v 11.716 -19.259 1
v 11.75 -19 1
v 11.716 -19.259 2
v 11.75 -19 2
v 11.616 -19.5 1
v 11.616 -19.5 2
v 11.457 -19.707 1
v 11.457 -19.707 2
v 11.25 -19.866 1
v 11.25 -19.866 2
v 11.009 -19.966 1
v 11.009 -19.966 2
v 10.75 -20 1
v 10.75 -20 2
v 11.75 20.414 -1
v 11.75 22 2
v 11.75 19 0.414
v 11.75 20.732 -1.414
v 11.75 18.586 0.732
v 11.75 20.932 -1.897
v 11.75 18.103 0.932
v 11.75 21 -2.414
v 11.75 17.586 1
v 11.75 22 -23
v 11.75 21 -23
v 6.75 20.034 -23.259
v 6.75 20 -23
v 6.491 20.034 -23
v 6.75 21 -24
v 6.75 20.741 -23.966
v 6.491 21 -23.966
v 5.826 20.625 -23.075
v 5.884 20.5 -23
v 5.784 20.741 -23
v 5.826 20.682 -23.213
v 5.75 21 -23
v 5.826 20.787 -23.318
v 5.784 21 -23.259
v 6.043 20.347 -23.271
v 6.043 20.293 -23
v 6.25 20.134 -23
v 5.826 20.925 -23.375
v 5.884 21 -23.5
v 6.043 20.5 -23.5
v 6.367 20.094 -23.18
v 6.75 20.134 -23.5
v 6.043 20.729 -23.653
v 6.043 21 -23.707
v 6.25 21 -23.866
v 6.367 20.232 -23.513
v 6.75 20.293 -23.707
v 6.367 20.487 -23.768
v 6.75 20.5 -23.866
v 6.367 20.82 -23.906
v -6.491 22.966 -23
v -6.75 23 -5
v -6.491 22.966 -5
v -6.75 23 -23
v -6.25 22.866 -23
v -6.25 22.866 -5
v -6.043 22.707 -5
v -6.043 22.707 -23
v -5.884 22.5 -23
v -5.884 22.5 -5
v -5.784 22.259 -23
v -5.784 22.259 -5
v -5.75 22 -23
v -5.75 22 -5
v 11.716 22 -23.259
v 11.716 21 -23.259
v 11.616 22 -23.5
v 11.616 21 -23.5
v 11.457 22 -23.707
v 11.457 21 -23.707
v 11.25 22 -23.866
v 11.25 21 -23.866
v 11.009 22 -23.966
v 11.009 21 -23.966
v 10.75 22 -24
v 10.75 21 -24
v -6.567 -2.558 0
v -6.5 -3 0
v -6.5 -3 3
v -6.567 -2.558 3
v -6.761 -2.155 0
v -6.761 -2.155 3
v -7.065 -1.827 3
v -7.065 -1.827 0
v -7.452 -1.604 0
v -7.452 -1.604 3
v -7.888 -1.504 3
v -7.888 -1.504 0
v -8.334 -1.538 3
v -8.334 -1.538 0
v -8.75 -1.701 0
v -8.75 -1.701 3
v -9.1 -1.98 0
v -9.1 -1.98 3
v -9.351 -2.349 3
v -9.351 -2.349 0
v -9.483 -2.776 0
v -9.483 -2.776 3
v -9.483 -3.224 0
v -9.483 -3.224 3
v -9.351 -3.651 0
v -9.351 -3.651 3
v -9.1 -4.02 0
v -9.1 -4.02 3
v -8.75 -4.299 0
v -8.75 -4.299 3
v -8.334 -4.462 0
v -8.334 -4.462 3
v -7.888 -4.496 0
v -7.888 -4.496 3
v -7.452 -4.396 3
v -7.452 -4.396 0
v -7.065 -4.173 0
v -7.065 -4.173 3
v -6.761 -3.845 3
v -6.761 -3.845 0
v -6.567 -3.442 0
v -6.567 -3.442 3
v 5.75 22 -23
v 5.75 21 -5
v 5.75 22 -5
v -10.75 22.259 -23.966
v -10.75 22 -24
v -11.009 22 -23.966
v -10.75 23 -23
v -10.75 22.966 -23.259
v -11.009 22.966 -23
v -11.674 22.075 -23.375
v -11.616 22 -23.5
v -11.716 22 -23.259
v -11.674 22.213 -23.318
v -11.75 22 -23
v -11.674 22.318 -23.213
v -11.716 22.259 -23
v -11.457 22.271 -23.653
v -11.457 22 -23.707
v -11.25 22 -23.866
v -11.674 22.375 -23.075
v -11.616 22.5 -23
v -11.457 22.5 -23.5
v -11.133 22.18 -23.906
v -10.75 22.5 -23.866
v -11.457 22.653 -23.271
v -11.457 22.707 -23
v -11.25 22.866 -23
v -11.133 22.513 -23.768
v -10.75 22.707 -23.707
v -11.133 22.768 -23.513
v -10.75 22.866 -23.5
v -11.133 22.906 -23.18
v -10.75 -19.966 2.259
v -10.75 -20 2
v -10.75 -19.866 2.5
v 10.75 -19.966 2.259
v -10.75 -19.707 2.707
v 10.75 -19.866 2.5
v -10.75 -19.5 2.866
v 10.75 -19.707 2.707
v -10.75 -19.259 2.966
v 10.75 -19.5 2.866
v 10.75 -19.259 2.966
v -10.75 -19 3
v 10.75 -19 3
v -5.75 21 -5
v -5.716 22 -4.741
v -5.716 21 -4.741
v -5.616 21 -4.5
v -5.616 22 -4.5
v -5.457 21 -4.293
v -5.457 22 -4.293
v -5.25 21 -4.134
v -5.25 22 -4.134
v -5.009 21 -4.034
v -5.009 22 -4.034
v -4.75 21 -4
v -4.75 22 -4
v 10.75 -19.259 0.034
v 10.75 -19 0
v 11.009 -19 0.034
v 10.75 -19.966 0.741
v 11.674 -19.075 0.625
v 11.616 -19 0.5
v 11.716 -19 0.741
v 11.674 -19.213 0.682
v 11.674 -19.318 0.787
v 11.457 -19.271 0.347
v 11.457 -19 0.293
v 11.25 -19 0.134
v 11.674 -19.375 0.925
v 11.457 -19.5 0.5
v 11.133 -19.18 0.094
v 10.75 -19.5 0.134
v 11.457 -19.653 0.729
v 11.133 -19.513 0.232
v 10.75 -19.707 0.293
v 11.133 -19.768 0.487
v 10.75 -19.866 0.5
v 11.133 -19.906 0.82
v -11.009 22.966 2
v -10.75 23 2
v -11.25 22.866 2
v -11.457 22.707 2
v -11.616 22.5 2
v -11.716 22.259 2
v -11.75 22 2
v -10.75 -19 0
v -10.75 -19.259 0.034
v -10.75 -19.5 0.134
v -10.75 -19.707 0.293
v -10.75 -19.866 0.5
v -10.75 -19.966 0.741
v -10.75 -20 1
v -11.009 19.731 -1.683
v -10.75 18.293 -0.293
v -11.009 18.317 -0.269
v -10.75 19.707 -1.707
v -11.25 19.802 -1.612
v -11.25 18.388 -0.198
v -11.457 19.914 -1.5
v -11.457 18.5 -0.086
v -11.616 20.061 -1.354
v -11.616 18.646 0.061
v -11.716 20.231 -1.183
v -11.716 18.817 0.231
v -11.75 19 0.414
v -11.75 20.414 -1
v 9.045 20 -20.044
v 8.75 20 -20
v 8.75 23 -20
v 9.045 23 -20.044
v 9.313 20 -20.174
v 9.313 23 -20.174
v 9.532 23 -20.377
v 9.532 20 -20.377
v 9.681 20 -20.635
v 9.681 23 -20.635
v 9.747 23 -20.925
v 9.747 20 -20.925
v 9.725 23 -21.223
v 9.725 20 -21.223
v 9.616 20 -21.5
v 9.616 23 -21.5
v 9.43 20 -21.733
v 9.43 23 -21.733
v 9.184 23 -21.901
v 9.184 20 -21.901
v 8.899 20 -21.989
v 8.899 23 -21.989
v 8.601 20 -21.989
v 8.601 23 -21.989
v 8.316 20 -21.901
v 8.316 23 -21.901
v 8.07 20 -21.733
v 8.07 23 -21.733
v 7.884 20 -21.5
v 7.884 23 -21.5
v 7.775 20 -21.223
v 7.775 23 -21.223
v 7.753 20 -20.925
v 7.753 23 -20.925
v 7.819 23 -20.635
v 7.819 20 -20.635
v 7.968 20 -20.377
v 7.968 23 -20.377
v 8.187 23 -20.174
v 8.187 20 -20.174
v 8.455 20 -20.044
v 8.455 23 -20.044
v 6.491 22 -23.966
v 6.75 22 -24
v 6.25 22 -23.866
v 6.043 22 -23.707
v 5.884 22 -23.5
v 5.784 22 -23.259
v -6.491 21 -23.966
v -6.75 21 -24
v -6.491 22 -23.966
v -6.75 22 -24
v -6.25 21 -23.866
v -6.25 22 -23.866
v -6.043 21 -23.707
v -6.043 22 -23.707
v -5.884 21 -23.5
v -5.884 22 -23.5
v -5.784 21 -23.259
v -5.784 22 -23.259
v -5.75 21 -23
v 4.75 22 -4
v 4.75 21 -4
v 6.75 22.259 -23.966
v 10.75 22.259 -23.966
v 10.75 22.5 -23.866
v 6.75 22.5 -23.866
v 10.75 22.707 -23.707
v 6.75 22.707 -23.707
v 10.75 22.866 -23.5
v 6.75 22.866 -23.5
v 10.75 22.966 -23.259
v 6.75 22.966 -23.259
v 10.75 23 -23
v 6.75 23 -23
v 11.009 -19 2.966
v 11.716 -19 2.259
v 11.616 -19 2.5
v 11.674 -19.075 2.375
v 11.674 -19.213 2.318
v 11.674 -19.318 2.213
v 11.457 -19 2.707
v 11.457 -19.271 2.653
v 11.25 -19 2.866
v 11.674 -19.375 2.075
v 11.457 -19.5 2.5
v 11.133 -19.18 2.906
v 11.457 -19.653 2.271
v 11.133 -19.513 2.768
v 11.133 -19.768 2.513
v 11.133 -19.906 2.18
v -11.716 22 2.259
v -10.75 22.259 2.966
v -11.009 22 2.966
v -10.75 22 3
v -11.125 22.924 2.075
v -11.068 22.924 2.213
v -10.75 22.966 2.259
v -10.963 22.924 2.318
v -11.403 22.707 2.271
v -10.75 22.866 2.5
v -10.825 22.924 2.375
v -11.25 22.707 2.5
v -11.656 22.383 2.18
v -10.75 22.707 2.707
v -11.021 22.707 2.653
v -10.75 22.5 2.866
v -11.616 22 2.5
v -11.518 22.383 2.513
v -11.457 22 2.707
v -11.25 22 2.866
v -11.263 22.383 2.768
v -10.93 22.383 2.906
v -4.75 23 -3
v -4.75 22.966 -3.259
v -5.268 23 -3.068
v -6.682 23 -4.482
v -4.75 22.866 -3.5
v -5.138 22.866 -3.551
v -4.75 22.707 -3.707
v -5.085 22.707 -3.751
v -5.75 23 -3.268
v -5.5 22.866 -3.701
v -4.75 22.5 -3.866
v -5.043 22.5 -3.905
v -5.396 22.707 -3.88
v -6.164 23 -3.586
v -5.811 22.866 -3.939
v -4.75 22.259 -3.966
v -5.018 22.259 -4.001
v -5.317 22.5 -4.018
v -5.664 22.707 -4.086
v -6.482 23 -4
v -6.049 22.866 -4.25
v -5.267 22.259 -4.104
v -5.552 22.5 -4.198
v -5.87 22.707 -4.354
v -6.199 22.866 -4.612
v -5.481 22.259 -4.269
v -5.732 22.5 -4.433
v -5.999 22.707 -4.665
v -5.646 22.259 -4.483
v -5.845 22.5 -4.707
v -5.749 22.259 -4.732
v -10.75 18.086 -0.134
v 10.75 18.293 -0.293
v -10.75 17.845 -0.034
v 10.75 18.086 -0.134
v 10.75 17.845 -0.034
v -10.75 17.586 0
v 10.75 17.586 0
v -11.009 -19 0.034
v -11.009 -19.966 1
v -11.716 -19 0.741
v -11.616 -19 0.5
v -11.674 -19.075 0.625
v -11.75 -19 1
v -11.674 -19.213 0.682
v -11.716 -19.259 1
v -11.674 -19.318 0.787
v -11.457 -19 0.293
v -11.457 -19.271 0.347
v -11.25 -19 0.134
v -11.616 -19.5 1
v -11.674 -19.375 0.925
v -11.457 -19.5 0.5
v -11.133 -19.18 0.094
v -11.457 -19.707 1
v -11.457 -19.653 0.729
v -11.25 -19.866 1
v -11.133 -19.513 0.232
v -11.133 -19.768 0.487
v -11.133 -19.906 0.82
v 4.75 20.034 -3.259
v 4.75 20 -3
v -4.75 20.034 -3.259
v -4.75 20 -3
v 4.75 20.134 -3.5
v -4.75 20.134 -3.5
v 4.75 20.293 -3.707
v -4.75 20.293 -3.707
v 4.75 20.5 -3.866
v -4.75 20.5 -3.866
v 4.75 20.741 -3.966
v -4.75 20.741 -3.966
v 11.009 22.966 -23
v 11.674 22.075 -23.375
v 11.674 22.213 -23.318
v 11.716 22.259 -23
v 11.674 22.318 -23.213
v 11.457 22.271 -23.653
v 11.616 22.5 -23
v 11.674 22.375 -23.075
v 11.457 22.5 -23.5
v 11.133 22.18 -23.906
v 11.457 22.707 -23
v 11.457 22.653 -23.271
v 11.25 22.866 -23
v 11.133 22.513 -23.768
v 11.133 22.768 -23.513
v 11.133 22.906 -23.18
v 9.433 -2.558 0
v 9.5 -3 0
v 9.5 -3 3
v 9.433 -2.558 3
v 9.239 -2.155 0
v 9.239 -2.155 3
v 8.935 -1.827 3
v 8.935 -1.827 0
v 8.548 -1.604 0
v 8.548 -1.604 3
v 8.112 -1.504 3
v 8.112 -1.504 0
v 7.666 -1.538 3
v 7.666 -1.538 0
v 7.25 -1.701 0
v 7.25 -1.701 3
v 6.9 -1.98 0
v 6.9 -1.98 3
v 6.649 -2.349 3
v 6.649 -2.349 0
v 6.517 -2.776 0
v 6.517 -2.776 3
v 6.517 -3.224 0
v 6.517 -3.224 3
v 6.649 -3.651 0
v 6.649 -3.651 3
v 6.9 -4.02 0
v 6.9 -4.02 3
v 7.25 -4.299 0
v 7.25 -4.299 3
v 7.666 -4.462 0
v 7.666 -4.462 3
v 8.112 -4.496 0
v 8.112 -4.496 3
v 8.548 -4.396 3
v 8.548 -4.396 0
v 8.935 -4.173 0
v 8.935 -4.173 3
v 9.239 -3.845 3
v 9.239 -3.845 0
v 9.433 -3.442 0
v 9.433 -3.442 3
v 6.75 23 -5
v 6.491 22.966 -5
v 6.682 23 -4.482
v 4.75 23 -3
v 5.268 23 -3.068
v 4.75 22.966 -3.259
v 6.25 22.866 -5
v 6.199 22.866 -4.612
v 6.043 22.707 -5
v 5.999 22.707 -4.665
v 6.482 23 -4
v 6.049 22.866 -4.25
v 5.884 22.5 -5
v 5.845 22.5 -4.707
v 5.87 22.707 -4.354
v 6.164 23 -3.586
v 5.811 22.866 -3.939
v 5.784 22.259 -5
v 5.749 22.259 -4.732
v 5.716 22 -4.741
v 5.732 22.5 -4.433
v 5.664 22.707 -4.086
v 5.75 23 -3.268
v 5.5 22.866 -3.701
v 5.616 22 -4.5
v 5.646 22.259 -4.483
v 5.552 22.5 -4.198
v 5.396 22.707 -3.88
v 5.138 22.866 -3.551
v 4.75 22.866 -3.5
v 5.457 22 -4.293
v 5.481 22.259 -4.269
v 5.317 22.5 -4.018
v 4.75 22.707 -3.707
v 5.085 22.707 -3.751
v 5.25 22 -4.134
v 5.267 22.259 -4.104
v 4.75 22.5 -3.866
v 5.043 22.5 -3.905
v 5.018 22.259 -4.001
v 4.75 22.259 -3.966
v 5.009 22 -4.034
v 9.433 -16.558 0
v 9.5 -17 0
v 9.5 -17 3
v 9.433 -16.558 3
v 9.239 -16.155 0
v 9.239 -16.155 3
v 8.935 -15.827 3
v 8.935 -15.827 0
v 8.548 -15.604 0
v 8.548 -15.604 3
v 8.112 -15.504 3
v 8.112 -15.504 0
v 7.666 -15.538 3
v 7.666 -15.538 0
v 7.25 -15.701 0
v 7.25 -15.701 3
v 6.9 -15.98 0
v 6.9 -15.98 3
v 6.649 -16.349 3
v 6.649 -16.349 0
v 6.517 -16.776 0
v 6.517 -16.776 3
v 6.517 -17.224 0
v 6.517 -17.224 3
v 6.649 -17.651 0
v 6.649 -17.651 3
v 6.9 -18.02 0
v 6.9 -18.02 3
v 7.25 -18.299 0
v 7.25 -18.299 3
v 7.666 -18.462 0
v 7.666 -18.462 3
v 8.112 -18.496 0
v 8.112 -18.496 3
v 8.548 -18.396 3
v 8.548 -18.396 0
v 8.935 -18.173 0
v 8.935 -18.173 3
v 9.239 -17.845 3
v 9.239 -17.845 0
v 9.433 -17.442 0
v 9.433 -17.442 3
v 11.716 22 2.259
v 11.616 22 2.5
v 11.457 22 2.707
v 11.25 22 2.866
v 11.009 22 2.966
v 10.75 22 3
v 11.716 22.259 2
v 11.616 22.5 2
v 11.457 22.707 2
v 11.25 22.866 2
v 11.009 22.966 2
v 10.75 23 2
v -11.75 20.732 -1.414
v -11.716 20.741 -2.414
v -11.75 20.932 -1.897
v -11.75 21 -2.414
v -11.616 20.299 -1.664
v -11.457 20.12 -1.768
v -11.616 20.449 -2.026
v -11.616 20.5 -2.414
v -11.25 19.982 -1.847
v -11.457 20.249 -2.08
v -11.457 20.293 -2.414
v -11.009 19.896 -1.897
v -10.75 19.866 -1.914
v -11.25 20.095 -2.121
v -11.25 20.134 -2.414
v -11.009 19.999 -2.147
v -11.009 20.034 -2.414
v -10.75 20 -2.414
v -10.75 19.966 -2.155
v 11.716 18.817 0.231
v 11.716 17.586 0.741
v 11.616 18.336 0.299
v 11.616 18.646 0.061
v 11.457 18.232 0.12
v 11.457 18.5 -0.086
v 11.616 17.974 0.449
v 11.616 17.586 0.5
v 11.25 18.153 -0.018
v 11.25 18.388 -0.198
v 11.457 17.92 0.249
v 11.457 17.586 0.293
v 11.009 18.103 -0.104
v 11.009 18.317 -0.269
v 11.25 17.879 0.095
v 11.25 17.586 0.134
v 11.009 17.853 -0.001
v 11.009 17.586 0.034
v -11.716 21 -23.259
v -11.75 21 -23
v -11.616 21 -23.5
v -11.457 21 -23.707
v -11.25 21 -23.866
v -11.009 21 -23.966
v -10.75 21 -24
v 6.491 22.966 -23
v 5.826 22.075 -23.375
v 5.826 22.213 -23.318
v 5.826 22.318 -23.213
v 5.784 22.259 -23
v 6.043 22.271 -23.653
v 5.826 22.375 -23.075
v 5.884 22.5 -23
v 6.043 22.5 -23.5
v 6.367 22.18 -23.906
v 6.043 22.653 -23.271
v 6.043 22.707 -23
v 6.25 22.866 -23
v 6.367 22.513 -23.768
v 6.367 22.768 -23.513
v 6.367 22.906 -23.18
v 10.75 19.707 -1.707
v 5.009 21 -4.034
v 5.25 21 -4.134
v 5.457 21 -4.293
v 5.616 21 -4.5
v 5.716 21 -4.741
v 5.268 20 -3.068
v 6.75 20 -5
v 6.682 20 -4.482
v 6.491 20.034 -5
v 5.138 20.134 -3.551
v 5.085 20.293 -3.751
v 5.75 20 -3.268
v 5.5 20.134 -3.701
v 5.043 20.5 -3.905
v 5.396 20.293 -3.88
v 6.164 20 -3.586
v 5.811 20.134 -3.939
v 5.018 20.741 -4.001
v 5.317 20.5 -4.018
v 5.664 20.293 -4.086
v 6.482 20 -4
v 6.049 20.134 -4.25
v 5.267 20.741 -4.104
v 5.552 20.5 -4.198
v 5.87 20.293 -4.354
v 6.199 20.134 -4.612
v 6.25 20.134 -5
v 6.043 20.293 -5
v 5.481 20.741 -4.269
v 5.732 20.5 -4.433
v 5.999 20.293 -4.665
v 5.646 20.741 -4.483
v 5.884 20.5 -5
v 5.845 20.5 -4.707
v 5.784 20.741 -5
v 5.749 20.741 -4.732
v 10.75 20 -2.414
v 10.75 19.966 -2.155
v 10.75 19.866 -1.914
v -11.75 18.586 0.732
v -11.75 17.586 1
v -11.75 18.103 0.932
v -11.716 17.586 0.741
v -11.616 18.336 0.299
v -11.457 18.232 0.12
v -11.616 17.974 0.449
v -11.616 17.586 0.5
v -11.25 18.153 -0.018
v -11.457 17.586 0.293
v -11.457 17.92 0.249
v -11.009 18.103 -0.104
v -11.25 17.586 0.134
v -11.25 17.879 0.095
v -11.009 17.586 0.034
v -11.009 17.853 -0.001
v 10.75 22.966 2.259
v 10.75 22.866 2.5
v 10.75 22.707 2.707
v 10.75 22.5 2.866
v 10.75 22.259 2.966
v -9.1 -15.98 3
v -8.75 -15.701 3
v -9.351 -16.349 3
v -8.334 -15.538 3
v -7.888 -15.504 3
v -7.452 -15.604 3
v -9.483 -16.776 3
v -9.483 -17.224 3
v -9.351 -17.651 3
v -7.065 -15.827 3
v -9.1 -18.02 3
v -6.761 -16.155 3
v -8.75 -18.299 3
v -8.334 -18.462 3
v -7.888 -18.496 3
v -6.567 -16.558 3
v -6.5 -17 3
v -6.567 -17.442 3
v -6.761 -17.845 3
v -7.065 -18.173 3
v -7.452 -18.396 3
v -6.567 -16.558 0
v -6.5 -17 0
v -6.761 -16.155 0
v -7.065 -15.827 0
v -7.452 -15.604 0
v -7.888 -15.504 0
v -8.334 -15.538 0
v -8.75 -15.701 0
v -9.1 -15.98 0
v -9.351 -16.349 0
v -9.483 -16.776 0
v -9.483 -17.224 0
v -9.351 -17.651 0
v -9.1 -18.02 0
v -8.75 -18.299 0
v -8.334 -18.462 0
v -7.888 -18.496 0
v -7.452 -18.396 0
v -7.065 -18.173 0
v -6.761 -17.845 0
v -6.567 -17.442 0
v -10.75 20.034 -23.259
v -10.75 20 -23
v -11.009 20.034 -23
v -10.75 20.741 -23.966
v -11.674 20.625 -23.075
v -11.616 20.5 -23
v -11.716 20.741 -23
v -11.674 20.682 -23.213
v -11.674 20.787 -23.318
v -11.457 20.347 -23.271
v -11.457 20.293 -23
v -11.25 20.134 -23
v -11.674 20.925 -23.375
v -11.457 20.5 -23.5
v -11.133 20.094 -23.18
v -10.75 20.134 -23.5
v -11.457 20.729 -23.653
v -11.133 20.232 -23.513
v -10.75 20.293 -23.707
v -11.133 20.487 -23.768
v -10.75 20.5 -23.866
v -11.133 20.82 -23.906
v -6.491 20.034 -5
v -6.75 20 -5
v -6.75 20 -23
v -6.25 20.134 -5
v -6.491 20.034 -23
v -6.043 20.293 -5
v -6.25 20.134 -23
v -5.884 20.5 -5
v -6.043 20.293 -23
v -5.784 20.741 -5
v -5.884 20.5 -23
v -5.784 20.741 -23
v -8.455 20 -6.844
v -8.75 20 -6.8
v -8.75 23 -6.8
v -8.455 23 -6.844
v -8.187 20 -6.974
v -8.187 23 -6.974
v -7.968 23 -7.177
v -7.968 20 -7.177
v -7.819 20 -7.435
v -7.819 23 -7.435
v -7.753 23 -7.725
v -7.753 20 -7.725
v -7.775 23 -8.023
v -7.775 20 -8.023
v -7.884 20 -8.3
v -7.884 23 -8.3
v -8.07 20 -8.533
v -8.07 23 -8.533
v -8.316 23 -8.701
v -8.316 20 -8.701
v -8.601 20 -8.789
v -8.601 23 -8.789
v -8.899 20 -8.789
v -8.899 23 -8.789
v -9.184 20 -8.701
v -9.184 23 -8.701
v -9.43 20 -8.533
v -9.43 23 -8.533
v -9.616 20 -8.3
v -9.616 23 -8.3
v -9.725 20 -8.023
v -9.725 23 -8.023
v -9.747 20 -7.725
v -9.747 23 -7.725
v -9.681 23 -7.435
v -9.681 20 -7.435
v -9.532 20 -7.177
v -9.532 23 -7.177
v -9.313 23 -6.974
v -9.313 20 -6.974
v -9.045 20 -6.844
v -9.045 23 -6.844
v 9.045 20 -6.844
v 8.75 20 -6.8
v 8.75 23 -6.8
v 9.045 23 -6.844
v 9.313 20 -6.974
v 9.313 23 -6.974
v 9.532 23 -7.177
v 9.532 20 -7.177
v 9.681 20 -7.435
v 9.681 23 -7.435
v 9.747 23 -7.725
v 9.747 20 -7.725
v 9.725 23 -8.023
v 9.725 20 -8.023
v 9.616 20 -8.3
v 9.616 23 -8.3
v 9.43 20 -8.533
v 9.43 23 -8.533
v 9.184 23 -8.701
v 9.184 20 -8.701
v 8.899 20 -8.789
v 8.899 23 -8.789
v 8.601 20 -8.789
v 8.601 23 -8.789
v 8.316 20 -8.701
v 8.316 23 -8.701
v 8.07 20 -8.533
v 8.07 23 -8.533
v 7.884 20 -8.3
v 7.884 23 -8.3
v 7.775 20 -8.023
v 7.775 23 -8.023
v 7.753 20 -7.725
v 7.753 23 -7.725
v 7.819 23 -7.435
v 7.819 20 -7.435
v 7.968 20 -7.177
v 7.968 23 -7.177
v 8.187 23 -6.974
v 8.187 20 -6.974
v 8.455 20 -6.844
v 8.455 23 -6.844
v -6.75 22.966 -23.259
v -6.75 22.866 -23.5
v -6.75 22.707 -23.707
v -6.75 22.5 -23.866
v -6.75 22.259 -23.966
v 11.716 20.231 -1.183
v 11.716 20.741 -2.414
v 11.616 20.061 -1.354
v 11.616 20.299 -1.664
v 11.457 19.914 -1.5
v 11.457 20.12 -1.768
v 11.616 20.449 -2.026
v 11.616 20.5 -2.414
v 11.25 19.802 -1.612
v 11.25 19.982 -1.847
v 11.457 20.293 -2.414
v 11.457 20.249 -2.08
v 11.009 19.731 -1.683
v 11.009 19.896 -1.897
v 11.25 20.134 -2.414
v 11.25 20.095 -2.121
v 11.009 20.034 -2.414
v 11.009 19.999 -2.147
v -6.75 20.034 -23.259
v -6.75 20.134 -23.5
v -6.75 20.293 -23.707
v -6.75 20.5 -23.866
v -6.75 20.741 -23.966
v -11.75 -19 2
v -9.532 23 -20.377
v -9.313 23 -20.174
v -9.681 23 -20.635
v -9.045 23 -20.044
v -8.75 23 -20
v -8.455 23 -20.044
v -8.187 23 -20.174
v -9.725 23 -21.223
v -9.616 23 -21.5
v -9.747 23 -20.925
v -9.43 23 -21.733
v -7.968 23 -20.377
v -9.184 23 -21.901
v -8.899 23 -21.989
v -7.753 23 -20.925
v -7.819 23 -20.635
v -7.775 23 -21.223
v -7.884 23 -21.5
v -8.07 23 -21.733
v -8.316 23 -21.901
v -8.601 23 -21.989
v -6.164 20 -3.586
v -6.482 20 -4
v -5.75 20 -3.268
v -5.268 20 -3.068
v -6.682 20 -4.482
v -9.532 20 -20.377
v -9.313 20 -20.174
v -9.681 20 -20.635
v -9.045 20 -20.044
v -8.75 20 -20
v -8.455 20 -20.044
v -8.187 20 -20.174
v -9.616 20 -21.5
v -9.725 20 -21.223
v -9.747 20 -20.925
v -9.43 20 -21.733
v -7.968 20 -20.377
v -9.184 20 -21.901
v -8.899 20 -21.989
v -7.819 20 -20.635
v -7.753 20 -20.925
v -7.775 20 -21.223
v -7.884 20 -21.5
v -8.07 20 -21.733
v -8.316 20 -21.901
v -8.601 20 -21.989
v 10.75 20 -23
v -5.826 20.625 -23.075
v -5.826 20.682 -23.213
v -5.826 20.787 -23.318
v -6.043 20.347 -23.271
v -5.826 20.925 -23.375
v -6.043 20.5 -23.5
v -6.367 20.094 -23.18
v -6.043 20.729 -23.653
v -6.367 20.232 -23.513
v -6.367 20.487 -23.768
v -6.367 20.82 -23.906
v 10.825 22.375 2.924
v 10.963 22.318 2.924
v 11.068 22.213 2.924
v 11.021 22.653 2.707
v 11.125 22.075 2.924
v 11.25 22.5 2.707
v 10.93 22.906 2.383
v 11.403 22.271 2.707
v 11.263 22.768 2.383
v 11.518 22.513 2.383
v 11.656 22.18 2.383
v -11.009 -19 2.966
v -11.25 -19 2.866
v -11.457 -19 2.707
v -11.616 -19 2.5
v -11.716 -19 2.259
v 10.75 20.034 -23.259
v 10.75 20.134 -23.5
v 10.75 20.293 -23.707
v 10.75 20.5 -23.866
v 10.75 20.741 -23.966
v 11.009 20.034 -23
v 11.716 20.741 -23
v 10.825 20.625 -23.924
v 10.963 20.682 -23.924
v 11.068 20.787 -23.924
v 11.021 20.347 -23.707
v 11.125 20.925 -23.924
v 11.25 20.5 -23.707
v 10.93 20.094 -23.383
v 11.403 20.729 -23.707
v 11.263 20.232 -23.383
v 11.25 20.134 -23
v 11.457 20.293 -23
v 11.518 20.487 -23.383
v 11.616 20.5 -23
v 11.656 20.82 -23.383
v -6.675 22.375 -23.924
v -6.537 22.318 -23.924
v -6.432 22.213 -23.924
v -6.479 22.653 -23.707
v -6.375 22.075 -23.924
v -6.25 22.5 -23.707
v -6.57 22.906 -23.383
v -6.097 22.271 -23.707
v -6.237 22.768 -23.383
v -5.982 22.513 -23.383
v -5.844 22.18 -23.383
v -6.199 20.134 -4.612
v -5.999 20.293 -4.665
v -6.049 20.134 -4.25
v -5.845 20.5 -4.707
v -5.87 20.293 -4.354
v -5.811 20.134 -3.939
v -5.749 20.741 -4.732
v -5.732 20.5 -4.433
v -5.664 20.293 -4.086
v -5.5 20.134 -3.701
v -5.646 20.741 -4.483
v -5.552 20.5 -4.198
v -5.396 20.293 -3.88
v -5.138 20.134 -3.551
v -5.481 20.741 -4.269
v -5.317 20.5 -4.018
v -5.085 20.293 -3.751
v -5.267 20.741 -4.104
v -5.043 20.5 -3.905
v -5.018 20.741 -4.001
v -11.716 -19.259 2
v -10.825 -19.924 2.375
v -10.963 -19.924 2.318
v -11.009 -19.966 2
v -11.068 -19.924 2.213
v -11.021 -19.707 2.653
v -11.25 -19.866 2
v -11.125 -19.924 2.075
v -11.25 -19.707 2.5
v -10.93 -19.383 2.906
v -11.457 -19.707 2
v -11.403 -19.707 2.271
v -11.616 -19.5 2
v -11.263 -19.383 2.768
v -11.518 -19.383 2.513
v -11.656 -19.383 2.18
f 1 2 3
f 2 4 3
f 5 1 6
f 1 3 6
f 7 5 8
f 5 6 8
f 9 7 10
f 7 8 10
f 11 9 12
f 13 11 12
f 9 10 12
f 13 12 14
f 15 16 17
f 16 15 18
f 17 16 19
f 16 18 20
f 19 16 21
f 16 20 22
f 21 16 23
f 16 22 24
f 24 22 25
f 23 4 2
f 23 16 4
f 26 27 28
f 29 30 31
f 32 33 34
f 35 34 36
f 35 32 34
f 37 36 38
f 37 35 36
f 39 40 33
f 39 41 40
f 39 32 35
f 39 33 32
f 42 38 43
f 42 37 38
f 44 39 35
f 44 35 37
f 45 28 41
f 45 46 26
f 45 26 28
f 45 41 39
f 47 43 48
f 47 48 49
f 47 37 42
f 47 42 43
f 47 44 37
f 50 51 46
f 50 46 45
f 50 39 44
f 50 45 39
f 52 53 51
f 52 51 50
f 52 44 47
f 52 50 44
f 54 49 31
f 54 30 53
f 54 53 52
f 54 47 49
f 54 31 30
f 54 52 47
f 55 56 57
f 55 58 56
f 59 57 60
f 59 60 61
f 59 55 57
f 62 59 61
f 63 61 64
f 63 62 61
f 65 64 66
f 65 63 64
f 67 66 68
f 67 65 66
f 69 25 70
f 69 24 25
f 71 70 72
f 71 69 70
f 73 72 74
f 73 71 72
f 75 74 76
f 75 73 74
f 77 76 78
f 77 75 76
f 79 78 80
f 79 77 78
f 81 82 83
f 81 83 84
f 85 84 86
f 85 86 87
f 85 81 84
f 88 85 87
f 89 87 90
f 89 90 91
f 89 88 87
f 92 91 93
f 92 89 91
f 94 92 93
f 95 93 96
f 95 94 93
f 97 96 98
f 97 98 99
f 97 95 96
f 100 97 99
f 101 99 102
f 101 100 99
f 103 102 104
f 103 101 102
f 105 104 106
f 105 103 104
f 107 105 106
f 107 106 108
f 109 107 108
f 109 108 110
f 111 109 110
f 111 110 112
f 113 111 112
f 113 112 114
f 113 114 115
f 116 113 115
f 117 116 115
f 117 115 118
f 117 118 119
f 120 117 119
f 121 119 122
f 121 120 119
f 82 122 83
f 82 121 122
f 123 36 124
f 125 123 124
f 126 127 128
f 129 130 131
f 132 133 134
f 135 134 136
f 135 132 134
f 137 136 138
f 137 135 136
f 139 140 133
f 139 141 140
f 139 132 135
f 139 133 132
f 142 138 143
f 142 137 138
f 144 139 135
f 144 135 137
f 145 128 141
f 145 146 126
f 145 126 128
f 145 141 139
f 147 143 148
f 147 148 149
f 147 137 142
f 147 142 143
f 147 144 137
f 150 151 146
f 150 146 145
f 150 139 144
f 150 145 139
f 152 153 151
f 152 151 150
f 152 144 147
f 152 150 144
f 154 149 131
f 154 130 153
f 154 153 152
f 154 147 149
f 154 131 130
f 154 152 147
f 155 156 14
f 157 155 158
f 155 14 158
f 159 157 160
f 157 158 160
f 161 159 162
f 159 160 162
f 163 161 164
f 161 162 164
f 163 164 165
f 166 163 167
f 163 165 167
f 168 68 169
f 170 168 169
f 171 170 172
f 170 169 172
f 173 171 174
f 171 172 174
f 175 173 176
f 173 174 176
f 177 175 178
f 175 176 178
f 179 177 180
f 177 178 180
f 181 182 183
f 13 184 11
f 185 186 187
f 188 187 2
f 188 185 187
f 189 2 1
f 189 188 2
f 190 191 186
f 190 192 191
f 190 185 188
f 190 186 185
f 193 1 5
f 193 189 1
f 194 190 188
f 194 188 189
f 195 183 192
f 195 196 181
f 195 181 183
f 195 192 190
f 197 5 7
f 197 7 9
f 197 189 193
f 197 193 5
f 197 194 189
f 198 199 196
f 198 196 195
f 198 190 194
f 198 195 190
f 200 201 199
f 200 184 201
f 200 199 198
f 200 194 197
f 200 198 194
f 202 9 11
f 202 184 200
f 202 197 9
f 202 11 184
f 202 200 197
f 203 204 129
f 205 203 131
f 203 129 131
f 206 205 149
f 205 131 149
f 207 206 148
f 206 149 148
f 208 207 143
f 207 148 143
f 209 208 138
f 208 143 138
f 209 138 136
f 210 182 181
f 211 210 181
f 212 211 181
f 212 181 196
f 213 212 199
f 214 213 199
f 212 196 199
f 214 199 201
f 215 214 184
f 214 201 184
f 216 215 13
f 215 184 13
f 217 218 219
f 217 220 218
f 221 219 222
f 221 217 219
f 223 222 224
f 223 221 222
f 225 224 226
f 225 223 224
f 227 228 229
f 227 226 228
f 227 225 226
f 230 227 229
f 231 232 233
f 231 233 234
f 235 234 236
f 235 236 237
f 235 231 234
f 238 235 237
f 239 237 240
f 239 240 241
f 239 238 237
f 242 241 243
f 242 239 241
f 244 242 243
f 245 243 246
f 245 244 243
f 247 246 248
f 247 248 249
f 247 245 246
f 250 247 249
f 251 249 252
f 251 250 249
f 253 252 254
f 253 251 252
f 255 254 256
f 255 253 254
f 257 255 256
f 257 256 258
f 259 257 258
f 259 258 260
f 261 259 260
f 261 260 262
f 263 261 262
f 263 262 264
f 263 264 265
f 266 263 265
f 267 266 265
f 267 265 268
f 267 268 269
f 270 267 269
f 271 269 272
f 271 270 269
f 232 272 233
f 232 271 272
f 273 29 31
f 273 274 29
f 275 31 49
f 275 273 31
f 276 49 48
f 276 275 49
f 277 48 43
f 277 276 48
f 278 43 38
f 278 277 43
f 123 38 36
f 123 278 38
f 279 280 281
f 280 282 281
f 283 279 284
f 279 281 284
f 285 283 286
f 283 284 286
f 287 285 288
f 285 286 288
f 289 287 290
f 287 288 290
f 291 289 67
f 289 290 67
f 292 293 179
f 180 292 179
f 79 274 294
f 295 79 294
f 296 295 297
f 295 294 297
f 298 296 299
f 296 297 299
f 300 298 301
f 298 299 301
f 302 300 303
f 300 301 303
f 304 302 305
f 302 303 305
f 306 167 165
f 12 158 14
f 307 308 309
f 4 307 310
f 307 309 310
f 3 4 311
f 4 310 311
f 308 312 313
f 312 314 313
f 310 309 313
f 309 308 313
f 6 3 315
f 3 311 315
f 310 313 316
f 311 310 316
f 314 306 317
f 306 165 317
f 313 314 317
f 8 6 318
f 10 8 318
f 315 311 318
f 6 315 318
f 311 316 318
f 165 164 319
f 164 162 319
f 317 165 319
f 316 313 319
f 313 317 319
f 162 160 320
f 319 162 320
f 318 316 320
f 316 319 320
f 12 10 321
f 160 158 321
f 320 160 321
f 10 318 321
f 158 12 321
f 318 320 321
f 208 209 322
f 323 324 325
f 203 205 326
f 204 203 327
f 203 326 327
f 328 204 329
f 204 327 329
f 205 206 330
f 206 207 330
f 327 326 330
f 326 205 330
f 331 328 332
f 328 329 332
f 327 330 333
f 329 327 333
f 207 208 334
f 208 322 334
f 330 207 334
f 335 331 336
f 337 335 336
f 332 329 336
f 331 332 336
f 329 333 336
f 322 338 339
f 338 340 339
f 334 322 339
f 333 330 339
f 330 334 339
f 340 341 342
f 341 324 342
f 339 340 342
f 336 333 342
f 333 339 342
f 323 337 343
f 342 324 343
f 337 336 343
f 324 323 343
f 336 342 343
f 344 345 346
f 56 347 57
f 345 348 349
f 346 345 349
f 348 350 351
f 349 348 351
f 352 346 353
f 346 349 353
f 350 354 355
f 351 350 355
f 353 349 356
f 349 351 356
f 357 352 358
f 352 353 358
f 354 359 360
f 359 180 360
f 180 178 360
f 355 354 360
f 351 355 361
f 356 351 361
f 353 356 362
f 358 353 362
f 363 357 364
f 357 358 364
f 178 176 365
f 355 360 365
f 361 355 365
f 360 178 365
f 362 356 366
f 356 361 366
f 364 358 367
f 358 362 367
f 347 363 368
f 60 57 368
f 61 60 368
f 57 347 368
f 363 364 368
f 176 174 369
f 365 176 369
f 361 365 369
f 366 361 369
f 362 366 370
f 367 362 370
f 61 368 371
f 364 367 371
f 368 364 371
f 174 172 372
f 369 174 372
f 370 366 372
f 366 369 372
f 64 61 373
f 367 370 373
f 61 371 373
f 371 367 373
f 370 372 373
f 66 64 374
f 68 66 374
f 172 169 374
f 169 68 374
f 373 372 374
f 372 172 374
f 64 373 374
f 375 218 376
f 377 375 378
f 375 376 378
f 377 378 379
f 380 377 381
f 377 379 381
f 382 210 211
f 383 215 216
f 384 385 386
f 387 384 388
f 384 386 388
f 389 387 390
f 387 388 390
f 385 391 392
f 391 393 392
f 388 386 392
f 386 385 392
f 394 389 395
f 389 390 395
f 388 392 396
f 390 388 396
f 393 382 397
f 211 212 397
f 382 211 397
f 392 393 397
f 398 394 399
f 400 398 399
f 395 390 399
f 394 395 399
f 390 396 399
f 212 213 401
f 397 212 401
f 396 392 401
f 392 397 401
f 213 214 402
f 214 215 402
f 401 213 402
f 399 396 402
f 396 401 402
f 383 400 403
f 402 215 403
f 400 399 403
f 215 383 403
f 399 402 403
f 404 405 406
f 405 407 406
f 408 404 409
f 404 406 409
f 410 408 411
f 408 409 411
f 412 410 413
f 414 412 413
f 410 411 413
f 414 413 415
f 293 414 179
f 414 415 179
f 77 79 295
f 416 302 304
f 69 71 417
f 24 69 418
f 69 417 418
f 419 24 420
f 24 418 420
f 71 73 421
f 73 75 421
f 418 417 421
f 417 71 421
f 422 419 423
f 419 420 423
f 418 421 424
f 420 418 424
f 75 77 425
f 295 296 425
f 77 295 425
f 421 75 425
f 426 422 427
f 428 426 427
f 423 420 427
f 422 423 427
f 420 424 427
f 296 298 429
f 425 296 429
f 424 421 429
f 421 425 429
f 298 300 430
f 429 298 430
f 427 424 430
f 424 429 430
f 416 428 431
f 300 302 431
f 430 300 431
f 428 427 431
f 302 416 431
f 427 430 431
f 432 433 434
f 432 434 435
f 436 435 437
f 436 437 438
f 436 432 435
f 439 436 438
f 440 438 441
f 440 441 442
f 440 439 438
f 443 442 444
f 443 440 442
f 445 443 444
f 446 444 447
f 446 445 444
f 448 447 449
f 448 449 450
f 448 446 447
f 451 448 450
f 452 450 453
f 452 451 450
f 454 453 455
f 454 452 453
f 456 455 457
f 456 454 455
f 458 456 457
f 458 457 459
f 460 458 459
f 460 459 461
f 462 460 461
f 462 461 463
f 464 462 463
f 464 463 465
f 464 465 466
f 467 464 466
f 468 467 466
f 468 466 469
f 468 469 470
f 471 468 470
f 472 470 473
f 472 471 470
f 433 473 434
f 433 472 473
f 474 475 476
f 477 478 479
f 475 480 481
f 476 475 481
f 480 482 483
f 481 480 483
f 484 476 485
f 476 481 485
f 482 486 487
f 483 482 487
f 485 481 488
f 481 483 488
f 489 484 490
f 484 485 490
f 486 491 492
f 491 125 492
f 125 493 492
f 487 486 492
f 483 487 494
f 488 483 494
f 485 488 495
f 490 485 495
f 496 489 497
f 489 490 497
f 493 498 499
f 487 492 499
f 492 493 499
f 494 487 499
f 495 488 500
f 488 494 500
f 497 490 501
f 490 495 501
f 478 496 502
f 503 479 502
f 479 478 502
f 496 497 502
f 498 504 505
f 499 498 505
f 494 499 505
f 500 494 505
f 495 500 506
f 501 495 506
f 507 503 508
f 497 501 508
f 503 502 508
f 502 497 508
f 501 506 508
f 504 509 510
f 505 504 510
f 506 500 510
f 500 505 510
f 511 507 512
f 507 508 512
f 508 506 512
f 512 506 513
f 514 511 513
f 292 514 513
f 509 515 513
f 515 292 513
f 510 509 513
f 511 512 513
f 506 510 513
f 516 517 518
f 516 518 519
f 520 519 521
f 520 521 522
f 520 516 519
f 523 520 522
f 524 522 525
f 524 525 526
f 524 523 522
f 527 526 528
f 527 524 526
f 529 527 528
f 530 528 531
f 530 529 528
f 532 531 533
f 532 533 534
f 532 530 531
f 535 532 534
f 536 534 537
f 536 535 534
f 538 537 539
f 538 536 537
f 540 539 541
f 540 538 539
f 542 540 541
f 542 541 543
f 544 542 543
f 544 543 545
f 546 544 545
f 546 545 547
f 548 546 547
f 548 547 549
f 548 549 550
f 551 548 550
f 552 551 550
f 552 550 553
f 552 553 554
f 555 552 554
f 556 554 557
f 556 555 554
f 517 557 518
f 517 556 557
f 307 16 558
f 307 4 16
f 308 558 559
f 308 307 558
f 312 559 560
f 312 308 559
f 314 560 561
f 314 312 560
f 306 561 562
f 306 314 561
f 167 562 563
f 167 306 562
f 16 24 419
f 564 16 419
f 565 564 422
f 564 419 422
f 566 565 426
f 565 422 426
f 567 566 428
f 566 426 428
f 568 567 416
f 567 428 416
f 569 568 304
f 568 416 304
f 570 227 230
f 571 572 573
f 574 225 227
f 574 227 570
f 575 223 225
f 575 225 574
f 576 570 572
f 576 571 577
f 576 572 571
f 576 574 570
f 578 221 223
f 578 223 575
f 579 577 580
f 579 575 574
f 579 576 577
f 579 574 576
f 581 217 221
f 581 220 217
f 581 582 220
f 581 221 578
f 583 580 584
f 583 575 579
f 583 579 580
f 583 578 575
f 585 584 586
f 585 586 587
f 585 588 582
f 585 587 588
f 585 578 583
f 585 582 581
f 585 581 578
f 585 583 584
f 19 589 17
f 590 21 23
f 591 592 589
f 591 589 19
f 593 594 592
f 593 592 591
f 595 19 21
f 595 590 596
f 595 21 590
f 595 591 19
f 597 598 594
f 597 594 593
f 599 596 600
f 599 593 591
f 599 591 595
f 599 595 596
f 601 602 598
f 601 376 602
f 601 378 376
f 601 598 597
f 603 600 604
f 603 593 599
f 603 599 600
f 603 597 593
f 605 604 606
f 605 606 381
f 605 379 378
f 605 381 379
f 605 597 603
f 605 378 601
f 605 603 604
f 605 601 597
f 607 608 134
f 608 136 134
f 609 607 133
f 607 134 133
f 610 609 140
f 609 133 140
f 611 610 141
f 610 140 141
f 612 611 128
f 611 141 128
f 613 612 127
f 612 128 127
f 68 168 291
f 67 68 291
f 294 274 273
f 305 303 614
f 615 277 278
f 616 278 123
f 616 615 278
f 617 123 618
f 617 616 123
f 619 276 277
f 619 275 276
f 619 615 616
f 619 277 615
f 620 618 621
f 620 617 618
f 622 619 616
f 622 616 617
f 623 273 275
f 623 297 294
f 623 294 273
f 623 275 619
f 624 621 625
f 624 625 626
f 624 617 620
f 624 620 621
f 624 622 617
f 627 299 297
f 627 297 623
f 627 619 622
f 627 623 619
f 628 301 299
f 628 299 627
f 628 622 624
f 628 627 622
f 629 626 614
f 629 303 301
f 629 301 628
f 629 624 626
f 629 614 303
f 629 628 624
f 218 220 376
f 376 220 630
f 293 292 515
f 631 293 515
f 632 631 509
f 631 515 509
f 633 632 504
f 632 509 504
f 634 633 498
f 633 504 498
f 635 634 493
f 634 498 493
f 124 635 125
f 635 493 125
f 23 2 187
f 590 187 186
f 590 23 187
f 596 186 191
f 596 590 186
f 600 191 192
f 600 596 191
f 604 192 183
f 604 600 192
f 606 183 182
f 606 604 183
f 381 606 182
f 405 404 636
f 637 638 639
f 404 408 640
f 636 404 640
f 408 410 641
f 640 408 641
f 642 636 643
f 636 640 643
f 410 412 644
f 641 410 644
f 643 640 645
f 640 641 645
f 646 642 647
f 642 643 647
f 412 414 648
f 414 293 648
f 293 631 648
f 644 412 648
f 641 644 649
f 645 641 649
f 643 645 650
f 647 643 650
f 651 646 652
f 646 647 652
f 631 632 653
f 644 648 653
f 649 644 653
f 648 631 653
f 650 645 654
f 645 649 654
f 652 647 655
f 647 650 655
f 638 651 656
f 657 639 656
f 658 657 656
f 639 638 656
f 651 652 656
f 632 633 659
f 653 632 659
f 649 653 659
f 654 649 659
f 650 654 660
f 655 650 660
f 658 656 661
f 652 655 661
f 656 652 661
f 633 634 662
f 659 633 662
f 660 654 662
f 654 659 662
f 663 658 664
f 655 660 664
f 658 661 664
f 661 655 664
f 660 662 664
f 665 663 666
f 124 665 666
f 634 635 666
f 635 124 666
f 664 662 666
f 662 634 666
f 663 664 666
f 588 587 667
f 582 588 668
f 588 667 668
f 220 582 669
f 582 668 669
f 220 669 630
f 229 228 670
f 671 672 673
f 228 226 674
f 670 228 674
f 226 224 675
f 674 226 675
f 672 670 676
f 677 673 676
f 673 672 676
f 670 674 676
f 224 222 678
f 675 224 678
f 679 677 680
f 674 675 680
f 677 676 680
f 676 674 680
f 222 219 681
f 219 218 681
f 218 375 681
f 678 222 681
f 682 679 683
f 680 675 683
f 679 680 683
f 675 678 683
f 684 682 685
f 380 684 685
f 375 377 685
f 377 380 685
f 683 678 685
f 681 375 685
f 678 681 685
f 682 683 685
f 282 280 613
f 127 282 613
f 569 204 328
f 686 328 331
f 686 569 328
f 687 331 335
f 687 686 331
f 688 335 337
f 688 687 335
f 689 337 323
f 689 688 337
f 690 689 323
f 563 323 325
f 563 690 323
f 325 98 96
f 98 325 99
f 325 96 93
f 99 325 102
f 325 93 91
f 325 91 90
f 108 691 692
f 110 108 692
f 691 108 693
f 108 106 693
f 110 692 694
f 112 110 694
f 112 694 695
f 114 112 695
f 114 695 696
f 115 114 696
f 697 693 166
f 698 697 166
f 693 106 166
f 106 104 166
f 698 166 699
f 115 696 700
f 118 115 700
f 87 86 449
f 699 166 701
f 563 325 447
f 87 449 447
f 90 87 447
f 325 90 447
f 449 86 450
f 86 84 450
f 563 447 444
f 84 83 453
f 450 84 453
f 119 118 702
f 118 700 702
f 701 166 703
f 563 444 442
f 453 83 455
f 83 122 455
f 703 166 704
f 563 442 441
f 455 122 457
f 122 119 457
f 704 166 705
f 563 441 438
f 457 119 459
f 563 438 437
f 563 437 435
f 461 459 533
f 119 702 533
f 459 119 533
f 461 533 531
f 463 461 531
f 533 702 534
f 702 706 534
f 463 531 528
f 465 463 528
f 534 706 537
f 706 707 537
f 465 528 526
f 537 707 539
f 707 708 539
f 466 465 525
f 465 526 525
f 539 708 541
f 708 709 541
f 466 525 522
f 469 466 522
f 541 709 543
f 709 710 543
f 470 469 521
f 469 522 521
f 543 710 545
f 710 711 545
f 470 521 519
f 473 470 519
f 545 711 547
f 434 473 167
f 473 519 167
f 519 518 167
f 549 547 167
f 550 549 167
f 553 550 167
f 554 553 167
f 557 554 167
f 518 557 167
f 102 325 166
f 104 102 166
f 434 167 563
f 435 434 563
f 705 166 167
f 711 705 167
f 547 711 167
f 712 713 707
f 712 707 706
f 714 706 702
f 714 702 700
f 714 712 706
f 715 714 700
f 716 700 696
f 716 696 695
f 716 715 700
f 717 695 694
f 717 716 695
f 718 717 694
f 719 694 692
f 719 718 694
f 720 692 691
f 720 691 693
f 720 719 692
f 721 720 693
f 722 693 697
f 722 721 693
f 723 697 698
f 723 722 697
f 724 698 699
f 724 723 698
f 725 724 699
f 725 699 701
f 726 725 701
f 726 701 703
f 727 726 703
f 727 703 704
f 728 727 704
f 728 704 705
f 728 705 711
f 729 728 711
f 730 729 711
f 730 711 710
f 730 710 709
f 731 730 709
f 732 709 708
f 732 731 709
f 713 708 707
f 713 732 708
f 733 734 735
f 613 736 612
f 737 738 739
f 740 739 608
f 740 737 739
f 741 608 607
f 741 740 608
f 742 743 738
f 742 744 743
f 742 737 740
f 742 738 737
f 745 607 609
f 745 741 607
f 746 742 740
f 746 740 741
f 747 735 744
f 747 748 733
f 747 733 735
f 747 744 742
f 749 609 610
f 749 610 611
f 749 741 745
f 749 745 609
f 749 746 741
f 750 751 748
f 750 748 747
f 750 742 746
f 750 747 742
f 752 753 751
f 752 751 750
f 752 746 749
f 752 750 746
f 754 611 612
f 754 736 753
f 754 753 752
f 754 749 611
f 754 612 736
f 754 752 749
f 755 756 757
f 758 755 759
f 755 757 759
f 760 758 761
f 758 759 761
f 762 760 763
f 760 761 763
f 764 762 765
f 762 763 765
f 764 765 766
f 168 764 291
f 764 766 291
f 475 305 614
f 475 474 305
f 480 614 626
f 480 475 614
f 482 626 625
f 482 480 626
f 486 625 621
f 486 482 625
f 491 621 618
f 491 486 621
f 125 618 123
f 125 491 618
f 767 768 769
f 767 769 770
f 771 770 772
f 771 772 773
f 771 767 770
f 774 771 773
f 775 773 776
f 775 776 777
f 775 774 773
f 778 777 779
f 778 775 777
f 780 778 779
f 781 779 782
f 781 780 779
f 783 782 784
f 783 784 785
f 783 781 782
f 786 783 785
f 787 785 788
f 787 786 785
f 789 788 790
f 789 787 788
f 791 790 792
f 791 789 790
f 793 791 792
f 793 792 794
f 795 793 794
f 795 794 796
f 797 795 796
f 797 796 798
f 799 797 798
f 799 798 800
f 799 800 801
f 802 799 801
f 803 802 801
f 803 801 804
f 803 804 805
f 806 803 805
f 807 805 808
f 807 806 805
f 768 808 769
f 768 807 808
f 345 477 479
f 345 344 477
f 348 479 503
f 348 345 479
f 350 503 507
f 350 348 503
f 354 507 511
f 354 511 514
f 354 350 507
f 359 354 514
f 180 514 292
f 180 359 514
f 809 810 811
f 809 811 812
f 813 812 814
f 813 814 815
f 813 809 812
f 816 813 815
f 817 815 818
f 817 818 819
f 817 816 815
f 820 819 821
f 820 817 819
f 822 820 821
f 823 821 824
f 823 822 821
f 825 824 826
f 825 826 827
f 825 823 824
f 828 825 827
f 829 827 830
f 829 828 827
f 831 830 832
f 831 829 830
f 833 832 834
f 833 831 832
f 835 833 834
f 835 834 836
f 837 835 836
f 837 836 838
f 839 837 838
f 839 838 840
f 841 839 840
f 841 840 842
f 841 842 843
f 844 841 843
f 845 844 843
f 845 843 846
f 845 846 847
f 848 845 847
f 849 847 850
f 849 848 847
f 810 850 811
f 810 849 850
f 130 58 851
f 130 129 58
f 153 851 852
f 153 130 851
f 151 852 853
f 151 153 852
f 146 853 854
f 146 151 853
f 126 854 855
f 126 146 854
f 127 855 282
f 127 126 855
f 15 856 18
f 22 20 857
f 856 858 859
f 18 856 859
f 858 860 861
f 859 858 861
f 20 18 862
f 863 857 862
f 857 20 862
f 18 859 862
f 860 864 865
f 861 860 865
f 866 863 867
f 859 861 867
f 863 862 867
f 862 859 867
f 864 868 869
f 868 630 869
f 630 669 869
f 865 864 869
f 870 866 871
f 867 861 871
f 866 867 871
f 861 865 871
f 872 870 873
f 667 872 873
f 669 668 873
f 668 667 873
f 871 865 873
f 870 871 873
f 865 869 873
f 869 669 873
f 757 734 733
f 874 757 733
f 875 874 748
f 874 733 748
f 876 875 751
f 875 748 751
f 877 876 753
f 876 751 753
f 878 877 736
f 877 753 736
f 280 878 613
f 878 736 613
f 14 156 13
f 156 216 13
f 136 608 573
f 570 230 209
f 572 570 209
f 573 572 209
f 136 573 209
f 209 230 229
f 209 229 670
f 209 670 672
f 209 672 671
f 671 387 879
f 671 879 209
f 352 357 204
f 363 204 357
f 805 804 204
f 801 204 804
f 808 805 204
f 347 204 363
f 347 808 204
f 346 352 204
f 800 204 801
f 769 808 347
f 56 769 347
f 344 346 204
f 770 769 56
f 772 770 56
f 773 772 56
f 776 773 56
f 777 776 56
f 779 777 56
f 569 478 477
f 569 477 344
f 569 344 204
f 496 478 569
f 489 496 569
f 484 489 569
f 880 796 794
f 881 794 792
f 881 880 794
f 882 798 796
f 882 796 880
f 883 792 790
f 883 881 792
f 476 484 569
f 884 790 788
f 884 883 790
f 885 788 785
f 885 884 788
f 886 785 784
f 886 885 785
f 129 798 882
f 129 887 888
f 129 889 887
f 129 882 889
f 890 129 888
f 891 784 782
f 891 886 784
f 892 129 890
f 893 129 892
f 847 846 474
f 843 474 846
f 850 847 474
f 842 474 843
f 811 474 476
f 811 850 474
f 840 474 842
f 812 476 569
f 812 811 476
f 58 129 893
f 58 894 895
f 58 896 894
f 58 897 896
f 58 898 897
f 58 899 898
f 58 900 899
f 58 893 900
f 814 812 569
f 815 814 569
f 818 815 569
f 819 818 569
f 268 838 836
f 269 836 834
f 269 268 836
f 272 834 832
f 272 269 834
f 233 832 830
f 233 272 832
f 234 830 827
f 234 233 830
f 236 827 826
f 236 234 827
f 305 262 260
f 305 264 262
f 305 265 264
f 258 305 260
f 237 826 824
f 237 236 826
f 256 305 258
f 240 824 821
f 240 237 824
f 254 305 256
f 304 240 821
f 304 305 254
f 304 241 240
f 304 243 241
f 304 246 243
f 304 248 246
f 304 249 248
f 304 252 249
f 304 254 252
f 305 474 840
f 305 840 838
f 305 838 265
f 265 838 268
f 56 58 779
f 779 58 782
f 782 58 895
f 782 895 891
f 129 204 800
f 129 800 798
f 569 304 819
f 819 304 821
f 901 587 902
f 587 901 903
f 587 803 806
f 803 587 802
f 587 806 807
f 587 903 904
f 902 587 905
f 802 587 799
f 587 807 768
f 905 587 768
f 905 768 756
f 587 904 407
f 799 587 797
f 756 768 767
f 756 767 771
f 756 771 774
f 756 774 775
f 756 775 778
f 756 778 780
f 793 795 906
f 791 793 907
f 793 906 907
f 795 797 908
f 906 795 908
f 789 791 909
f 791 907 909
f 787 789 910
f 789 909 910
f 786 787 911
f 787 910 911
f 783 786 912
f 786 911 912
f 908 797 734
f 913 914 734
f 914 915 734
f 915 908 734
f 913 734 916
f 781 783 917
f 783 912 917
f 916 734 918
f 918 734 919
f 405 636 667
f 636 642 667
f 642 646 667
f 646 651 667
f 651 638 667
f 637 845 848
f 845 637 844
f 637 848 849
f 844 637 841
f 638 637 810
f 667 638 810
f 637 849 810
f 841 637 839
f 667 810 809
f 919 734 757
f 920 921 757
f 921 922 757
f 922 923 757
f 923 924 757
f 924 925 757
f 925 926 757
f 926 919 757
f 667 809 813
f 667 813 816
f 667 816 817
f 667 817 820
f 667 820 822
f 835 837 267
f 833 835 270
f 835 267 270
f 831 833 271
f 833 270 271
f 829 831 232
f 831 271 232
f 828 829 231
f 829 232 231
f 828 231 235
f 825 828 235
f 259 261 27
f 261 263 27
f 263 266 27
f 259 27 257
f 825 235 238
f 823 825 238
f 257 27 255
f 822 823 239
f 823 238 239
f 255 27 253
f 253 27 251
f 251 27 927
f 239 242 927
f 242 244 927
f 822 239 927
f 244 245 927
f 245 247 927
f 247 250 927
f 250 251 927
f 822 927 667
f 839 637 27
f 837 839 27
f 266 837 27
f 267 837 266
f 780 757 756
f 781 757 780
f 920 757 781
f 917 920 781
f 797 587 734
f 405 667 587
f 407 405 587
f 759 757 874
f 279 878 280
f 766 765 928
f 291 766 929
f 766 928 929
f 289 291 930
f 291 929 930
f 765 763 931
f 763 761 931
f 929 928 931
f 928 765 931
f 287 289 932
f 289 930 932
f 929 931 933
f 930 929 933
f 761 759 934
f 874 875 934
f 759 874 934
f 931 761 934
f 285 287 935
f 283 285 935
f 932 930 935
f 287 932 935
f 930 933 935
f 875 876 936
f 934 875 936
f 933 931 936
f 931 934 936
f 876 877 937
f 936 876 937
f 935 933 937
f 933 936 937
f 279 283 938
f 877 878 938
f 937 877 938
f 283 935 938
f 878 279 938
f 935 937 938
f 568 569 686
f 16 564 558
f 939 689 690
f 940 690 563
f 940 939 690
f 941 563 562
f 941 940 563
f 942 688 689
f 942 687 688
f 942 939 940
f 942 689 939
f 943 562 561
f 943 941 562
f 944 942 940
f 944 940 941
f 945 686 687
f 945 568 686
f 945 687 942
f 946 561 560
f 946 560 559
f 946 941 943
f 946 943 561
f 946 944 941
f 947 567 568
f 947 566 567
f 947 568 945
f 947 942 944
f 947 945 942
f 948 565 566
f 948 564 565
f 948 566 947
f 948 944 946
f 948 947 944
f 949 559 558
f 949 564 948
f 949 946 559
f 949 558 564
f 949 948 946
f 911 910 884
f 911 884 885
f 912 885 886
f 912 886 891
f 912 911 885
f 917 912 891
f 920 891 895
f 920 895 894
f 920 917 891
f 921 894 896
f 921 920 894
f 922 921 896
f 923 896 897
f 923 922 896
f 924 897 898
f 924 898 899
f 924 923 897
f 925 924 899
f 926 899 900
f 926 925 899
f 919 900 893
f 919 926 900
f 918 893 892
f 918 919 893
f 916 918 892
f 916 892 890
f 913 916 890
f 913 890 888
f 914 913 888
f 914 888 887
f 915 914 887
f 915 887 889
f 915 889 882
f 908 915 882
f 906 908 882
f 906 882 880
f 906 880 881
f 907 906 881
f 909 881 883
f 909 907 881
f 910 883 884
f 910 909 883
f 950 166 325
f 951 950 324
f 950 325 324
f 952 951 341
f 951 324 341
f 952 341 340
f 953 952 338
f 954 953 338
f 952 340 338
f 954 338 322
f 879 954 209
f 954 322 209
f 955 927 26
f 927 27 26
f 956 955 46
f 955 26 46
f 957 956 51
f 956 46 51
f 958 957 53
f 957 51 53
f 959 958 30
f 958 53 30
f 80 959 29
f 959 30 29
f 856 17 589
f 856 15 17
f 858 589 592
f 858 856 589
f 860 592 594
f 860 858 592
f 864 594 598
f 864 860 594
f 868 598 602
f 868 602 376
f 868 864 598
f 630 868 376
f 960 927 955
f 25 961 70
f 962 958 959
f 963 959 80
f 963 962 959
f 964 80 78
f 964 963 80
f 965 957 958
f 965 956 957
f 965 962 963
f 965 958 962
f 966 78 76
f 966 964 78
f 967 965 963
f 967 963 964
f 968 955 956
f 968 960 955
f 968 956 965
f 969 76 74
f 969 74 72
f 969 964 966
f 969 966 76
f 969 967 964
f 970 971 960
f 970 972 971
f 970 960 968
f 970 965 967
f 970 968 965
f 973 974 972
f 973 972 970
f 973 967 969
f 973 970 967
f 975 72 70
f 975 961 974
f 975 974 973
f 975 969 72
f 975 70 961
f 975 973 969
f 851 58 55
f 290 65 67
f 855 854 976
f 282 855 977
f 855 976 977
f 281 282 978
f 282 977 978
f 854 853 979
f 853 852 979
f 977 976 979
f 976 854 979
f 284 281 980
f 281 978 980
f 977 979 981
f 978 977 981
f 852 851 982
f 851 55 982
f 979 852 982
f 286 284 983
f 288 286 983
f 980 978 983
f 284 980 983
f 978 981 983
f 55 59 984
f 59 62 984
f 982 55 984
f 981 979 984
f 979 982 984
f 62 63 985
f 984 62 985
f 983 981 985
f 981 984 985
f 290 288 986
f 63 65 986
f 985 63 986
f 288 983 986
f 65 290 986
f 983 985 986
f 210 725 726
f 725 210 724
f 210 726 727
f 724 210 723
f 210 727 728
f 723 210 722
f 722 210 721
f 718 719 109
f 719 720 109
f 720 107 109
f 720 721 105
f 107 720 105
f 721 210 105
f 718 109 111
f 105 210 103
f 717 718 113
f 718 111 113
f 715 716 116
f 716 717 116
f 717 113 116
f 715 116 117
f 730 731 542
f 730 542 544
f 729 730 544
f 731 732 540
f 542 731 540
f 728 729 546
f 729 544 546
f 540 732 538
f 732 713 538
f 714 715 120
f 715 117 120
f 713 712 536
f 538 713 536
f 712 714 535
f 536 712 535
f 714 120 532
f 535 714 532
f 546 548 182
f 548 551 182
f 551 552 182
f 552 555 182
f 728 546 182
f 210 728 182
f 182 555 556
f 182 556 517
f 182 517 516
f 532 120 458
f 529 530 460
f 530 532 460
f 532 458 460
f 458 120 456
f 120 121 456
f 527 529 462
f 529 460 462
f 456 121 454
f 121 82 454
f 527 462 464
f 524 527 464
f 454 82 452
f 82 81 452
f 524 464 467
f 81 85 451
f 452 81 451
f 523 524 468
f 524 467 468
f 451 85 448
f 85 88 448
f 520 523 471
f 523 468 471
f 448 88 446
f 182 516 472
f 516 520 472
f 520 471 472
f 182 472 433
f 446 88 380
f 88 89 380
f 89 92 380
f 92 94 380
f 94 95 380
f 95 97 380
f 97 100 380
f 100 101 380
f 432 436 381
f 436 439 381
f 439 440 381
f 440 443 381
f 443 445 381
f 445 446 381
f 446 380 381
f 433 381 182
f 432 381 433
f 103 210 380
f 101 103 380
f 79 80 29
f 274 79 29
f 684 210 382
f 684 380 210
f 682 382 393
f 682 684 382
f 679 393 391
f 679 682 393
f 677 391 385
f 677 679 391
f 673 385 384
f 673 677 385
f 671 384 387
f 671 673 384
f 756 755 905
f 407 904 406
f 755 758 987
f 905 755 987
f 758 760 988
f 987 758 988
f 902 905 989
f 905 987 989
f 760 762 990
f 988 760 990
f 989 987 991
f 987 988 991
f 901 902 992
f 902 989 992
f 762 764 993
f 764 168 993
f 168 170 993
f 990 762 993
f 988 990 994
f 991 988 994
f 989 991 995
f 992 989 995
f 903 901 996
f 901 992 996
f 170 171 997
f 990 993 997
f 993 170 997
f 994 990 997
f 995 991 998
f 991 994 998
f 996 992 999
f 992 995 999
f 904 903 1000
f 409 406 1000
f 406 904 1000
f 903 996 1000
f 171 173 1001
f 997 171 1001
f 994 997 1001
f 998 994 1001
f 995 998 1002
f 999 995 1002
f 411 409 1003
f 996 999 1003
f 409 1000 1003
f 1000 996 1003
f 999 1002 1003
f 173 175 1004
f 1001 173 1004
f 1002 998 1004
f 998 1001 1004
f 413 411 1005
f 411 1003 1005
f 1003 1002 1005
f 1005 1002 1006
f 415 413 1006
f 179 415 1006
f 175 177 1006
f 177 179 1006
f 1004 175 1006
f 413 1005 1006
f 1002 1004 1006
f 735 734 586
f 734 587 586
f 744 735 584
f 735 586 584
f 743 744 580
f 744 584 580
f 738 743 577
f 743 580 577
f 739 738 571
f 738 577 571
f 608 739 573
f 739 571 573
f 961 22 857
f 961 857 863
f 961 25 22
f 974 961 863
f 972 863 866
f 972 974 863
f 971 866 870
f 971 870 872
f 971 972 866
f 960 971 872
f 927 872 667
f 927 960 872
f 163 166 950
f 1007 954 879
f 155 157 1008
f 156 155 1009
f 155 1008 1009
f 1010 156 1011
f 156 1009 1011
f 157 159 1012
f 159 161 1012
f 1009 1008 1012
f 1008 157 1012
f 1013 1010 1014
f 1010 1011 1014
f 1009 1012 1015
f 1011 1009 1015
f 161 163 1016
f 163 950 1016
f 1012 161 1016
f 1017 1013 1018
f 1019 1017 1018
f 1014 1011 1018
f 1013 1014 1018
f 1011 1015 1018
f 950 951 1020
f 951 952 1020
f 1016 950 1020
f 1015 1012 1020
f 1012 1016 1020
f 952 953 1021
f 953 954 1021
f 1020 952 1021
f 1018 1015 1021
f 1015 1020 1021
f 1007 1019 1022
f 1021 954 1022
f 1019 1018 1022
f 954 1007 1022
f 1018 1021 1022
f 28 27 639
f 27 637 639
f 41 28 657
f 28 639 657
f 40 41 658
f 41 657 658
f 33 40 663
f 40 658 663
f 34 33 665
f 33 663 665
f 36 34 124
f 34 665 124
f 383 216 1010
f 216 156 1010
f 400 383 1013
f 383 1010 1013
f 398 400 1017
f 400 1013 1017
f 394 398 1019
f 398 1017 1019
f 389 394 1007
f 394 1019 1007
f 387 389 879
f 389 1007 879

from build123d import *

# Parameters (mm, degrees)
SKETCH_1_W      = 23.5
SKETCH_1_H      = 40
SKETCH_1_R      = 1.5
EXTRUDE_1_DEPTH = 3
SKETCH_2_R      = 1
SKETCH_2_W      = 23.5
SKETCH_2_H      = 3
EXTRUDE_2_DEPTH = 3
CHAMFER_1_SIZE  = 2
FILLET_1_R      = 1


with BuildPart() as part:
    # 草图1 → 凸台-拉伸1 (new body)
    with BuildSketch(Plane.XY):
        Rectangle(SKETCH_1_W, SKETCH_1_H)
        with Locations((-8, -3)):
            Circle(SKETCH_1_R, mode=Mode.SUBTRACT)
        with Locations((8, -3)):
            Circle(SKETCH_1_R, mode=Mode.SUBTRACT)
        with Locations((8, -17)):
            Circle(SKETCH_1_R, mode=Mode.SUBTRACT)
        with Locations((-8, -17)):
            Circle(SKETCH_1_R, mode=Mode.SUBTRACT)
    extrude(amount=EXTRUDE_1_DEPTH)

    # 草图2 → 凸台-拉伸2 (add)
    # profile 1 of 2: a face of its own
    with BuildSketch(Plane(origin=(0, 20, 0), x_dir=(1, 0, 0), z_dir=(0, 1, 0))):
        Polygon((-5.75, 24), (-11.75, 24), (-11.75, 0), (11.75, 0), (11.75, 24), (5.75, 24), (5.75, 4), (-5.75, 4), align=None)
        with Locations(Location((-8.75, 7.8, 0), (0, 0, 270))):
            Circle(SKETCH_2_R, mode=Mode.SUBTRACT)
        with Locations(Location((8.75, 7.8, 0), (0, 0, 270))):
            Circle(SKETCH_2_R, mode=Mode.SUBTRACT)
        with Locations(Location((-8.75, 21, 0), (0, 0, 270))):
            Circle(SKETCH_2_R, mode=Mode.SUBTRACT)
        with Locations(Location((8.75, 21, 0), (0, 0, 270))):
            Circle(SKETCH_2_R, mode=Mode.SUBTRACT)
    # profile 2 of 2: a face of its own
    with BuildSketch(Plane(origin=(0, 20, 0), x_dir=(1, 0, 0), z_dir=(0, 1, 0))):
        with Locations((0, -1.5)):
            Rectangle(SKETCH_2_W, SKETCH_2_H)
    extrude(amount=EXTRUDE_2_DEPTH)

    # 倒角1
    chamfer_1_edges = [part.edges().sort_by_distance(p)[0] for p in [
        (0, 20, 0),
    ]]
    chamfer(chamfer_1_edges, length=CHAMFER_1_SIZE)

    # 圆角1
    fillet_1_edges = [part.edges().sort_by_distance(p)[0] for p in [
        (-11.75, 1.5, 3),
        (0, -20, 3),
        (11.75, 20, -13),
        (-8.75, 20, -24),
        (-5.75, 20, -14),
        (0, 20, -4),
        (8.75, 20, -24),
        (8.75, 23, -24),
        (11.75, 21.5, -24),
        (5.75, 20, -14),
        (5.75, 21.5, -24),
        (0, 23, -4),
        (5.75, 21.5, -4),
        (-5.75, 23, -14),
        (-5.75, 21.5, -4),
        (-8.75, 23, -24),
        (-5.75, 21.5, -24),
        (-11.75, 20, -13),
        (-11.75, 21.5, -24),
        (11.75, 23, -10.5),
        (5.75, 23, -14),
        (-11.75, 23, -10.5),
        (0, 23, 3),
        (11.75, 1.5, 3),
        (0, -20, 0),
        (11.75, -1, 0),
        (0, 20, -2),
        (-11.75, -1, 0),
        (0, 18, 0),
        (-11.75, 19, -1),
        (11.75, 19, -1),
        (11.75, -20, 1.5),
        (-11.75, -20, 1.5),
    ]]
    fillet(fillet_1_edges, radius=FILLET_1_R)


solid = part.part
